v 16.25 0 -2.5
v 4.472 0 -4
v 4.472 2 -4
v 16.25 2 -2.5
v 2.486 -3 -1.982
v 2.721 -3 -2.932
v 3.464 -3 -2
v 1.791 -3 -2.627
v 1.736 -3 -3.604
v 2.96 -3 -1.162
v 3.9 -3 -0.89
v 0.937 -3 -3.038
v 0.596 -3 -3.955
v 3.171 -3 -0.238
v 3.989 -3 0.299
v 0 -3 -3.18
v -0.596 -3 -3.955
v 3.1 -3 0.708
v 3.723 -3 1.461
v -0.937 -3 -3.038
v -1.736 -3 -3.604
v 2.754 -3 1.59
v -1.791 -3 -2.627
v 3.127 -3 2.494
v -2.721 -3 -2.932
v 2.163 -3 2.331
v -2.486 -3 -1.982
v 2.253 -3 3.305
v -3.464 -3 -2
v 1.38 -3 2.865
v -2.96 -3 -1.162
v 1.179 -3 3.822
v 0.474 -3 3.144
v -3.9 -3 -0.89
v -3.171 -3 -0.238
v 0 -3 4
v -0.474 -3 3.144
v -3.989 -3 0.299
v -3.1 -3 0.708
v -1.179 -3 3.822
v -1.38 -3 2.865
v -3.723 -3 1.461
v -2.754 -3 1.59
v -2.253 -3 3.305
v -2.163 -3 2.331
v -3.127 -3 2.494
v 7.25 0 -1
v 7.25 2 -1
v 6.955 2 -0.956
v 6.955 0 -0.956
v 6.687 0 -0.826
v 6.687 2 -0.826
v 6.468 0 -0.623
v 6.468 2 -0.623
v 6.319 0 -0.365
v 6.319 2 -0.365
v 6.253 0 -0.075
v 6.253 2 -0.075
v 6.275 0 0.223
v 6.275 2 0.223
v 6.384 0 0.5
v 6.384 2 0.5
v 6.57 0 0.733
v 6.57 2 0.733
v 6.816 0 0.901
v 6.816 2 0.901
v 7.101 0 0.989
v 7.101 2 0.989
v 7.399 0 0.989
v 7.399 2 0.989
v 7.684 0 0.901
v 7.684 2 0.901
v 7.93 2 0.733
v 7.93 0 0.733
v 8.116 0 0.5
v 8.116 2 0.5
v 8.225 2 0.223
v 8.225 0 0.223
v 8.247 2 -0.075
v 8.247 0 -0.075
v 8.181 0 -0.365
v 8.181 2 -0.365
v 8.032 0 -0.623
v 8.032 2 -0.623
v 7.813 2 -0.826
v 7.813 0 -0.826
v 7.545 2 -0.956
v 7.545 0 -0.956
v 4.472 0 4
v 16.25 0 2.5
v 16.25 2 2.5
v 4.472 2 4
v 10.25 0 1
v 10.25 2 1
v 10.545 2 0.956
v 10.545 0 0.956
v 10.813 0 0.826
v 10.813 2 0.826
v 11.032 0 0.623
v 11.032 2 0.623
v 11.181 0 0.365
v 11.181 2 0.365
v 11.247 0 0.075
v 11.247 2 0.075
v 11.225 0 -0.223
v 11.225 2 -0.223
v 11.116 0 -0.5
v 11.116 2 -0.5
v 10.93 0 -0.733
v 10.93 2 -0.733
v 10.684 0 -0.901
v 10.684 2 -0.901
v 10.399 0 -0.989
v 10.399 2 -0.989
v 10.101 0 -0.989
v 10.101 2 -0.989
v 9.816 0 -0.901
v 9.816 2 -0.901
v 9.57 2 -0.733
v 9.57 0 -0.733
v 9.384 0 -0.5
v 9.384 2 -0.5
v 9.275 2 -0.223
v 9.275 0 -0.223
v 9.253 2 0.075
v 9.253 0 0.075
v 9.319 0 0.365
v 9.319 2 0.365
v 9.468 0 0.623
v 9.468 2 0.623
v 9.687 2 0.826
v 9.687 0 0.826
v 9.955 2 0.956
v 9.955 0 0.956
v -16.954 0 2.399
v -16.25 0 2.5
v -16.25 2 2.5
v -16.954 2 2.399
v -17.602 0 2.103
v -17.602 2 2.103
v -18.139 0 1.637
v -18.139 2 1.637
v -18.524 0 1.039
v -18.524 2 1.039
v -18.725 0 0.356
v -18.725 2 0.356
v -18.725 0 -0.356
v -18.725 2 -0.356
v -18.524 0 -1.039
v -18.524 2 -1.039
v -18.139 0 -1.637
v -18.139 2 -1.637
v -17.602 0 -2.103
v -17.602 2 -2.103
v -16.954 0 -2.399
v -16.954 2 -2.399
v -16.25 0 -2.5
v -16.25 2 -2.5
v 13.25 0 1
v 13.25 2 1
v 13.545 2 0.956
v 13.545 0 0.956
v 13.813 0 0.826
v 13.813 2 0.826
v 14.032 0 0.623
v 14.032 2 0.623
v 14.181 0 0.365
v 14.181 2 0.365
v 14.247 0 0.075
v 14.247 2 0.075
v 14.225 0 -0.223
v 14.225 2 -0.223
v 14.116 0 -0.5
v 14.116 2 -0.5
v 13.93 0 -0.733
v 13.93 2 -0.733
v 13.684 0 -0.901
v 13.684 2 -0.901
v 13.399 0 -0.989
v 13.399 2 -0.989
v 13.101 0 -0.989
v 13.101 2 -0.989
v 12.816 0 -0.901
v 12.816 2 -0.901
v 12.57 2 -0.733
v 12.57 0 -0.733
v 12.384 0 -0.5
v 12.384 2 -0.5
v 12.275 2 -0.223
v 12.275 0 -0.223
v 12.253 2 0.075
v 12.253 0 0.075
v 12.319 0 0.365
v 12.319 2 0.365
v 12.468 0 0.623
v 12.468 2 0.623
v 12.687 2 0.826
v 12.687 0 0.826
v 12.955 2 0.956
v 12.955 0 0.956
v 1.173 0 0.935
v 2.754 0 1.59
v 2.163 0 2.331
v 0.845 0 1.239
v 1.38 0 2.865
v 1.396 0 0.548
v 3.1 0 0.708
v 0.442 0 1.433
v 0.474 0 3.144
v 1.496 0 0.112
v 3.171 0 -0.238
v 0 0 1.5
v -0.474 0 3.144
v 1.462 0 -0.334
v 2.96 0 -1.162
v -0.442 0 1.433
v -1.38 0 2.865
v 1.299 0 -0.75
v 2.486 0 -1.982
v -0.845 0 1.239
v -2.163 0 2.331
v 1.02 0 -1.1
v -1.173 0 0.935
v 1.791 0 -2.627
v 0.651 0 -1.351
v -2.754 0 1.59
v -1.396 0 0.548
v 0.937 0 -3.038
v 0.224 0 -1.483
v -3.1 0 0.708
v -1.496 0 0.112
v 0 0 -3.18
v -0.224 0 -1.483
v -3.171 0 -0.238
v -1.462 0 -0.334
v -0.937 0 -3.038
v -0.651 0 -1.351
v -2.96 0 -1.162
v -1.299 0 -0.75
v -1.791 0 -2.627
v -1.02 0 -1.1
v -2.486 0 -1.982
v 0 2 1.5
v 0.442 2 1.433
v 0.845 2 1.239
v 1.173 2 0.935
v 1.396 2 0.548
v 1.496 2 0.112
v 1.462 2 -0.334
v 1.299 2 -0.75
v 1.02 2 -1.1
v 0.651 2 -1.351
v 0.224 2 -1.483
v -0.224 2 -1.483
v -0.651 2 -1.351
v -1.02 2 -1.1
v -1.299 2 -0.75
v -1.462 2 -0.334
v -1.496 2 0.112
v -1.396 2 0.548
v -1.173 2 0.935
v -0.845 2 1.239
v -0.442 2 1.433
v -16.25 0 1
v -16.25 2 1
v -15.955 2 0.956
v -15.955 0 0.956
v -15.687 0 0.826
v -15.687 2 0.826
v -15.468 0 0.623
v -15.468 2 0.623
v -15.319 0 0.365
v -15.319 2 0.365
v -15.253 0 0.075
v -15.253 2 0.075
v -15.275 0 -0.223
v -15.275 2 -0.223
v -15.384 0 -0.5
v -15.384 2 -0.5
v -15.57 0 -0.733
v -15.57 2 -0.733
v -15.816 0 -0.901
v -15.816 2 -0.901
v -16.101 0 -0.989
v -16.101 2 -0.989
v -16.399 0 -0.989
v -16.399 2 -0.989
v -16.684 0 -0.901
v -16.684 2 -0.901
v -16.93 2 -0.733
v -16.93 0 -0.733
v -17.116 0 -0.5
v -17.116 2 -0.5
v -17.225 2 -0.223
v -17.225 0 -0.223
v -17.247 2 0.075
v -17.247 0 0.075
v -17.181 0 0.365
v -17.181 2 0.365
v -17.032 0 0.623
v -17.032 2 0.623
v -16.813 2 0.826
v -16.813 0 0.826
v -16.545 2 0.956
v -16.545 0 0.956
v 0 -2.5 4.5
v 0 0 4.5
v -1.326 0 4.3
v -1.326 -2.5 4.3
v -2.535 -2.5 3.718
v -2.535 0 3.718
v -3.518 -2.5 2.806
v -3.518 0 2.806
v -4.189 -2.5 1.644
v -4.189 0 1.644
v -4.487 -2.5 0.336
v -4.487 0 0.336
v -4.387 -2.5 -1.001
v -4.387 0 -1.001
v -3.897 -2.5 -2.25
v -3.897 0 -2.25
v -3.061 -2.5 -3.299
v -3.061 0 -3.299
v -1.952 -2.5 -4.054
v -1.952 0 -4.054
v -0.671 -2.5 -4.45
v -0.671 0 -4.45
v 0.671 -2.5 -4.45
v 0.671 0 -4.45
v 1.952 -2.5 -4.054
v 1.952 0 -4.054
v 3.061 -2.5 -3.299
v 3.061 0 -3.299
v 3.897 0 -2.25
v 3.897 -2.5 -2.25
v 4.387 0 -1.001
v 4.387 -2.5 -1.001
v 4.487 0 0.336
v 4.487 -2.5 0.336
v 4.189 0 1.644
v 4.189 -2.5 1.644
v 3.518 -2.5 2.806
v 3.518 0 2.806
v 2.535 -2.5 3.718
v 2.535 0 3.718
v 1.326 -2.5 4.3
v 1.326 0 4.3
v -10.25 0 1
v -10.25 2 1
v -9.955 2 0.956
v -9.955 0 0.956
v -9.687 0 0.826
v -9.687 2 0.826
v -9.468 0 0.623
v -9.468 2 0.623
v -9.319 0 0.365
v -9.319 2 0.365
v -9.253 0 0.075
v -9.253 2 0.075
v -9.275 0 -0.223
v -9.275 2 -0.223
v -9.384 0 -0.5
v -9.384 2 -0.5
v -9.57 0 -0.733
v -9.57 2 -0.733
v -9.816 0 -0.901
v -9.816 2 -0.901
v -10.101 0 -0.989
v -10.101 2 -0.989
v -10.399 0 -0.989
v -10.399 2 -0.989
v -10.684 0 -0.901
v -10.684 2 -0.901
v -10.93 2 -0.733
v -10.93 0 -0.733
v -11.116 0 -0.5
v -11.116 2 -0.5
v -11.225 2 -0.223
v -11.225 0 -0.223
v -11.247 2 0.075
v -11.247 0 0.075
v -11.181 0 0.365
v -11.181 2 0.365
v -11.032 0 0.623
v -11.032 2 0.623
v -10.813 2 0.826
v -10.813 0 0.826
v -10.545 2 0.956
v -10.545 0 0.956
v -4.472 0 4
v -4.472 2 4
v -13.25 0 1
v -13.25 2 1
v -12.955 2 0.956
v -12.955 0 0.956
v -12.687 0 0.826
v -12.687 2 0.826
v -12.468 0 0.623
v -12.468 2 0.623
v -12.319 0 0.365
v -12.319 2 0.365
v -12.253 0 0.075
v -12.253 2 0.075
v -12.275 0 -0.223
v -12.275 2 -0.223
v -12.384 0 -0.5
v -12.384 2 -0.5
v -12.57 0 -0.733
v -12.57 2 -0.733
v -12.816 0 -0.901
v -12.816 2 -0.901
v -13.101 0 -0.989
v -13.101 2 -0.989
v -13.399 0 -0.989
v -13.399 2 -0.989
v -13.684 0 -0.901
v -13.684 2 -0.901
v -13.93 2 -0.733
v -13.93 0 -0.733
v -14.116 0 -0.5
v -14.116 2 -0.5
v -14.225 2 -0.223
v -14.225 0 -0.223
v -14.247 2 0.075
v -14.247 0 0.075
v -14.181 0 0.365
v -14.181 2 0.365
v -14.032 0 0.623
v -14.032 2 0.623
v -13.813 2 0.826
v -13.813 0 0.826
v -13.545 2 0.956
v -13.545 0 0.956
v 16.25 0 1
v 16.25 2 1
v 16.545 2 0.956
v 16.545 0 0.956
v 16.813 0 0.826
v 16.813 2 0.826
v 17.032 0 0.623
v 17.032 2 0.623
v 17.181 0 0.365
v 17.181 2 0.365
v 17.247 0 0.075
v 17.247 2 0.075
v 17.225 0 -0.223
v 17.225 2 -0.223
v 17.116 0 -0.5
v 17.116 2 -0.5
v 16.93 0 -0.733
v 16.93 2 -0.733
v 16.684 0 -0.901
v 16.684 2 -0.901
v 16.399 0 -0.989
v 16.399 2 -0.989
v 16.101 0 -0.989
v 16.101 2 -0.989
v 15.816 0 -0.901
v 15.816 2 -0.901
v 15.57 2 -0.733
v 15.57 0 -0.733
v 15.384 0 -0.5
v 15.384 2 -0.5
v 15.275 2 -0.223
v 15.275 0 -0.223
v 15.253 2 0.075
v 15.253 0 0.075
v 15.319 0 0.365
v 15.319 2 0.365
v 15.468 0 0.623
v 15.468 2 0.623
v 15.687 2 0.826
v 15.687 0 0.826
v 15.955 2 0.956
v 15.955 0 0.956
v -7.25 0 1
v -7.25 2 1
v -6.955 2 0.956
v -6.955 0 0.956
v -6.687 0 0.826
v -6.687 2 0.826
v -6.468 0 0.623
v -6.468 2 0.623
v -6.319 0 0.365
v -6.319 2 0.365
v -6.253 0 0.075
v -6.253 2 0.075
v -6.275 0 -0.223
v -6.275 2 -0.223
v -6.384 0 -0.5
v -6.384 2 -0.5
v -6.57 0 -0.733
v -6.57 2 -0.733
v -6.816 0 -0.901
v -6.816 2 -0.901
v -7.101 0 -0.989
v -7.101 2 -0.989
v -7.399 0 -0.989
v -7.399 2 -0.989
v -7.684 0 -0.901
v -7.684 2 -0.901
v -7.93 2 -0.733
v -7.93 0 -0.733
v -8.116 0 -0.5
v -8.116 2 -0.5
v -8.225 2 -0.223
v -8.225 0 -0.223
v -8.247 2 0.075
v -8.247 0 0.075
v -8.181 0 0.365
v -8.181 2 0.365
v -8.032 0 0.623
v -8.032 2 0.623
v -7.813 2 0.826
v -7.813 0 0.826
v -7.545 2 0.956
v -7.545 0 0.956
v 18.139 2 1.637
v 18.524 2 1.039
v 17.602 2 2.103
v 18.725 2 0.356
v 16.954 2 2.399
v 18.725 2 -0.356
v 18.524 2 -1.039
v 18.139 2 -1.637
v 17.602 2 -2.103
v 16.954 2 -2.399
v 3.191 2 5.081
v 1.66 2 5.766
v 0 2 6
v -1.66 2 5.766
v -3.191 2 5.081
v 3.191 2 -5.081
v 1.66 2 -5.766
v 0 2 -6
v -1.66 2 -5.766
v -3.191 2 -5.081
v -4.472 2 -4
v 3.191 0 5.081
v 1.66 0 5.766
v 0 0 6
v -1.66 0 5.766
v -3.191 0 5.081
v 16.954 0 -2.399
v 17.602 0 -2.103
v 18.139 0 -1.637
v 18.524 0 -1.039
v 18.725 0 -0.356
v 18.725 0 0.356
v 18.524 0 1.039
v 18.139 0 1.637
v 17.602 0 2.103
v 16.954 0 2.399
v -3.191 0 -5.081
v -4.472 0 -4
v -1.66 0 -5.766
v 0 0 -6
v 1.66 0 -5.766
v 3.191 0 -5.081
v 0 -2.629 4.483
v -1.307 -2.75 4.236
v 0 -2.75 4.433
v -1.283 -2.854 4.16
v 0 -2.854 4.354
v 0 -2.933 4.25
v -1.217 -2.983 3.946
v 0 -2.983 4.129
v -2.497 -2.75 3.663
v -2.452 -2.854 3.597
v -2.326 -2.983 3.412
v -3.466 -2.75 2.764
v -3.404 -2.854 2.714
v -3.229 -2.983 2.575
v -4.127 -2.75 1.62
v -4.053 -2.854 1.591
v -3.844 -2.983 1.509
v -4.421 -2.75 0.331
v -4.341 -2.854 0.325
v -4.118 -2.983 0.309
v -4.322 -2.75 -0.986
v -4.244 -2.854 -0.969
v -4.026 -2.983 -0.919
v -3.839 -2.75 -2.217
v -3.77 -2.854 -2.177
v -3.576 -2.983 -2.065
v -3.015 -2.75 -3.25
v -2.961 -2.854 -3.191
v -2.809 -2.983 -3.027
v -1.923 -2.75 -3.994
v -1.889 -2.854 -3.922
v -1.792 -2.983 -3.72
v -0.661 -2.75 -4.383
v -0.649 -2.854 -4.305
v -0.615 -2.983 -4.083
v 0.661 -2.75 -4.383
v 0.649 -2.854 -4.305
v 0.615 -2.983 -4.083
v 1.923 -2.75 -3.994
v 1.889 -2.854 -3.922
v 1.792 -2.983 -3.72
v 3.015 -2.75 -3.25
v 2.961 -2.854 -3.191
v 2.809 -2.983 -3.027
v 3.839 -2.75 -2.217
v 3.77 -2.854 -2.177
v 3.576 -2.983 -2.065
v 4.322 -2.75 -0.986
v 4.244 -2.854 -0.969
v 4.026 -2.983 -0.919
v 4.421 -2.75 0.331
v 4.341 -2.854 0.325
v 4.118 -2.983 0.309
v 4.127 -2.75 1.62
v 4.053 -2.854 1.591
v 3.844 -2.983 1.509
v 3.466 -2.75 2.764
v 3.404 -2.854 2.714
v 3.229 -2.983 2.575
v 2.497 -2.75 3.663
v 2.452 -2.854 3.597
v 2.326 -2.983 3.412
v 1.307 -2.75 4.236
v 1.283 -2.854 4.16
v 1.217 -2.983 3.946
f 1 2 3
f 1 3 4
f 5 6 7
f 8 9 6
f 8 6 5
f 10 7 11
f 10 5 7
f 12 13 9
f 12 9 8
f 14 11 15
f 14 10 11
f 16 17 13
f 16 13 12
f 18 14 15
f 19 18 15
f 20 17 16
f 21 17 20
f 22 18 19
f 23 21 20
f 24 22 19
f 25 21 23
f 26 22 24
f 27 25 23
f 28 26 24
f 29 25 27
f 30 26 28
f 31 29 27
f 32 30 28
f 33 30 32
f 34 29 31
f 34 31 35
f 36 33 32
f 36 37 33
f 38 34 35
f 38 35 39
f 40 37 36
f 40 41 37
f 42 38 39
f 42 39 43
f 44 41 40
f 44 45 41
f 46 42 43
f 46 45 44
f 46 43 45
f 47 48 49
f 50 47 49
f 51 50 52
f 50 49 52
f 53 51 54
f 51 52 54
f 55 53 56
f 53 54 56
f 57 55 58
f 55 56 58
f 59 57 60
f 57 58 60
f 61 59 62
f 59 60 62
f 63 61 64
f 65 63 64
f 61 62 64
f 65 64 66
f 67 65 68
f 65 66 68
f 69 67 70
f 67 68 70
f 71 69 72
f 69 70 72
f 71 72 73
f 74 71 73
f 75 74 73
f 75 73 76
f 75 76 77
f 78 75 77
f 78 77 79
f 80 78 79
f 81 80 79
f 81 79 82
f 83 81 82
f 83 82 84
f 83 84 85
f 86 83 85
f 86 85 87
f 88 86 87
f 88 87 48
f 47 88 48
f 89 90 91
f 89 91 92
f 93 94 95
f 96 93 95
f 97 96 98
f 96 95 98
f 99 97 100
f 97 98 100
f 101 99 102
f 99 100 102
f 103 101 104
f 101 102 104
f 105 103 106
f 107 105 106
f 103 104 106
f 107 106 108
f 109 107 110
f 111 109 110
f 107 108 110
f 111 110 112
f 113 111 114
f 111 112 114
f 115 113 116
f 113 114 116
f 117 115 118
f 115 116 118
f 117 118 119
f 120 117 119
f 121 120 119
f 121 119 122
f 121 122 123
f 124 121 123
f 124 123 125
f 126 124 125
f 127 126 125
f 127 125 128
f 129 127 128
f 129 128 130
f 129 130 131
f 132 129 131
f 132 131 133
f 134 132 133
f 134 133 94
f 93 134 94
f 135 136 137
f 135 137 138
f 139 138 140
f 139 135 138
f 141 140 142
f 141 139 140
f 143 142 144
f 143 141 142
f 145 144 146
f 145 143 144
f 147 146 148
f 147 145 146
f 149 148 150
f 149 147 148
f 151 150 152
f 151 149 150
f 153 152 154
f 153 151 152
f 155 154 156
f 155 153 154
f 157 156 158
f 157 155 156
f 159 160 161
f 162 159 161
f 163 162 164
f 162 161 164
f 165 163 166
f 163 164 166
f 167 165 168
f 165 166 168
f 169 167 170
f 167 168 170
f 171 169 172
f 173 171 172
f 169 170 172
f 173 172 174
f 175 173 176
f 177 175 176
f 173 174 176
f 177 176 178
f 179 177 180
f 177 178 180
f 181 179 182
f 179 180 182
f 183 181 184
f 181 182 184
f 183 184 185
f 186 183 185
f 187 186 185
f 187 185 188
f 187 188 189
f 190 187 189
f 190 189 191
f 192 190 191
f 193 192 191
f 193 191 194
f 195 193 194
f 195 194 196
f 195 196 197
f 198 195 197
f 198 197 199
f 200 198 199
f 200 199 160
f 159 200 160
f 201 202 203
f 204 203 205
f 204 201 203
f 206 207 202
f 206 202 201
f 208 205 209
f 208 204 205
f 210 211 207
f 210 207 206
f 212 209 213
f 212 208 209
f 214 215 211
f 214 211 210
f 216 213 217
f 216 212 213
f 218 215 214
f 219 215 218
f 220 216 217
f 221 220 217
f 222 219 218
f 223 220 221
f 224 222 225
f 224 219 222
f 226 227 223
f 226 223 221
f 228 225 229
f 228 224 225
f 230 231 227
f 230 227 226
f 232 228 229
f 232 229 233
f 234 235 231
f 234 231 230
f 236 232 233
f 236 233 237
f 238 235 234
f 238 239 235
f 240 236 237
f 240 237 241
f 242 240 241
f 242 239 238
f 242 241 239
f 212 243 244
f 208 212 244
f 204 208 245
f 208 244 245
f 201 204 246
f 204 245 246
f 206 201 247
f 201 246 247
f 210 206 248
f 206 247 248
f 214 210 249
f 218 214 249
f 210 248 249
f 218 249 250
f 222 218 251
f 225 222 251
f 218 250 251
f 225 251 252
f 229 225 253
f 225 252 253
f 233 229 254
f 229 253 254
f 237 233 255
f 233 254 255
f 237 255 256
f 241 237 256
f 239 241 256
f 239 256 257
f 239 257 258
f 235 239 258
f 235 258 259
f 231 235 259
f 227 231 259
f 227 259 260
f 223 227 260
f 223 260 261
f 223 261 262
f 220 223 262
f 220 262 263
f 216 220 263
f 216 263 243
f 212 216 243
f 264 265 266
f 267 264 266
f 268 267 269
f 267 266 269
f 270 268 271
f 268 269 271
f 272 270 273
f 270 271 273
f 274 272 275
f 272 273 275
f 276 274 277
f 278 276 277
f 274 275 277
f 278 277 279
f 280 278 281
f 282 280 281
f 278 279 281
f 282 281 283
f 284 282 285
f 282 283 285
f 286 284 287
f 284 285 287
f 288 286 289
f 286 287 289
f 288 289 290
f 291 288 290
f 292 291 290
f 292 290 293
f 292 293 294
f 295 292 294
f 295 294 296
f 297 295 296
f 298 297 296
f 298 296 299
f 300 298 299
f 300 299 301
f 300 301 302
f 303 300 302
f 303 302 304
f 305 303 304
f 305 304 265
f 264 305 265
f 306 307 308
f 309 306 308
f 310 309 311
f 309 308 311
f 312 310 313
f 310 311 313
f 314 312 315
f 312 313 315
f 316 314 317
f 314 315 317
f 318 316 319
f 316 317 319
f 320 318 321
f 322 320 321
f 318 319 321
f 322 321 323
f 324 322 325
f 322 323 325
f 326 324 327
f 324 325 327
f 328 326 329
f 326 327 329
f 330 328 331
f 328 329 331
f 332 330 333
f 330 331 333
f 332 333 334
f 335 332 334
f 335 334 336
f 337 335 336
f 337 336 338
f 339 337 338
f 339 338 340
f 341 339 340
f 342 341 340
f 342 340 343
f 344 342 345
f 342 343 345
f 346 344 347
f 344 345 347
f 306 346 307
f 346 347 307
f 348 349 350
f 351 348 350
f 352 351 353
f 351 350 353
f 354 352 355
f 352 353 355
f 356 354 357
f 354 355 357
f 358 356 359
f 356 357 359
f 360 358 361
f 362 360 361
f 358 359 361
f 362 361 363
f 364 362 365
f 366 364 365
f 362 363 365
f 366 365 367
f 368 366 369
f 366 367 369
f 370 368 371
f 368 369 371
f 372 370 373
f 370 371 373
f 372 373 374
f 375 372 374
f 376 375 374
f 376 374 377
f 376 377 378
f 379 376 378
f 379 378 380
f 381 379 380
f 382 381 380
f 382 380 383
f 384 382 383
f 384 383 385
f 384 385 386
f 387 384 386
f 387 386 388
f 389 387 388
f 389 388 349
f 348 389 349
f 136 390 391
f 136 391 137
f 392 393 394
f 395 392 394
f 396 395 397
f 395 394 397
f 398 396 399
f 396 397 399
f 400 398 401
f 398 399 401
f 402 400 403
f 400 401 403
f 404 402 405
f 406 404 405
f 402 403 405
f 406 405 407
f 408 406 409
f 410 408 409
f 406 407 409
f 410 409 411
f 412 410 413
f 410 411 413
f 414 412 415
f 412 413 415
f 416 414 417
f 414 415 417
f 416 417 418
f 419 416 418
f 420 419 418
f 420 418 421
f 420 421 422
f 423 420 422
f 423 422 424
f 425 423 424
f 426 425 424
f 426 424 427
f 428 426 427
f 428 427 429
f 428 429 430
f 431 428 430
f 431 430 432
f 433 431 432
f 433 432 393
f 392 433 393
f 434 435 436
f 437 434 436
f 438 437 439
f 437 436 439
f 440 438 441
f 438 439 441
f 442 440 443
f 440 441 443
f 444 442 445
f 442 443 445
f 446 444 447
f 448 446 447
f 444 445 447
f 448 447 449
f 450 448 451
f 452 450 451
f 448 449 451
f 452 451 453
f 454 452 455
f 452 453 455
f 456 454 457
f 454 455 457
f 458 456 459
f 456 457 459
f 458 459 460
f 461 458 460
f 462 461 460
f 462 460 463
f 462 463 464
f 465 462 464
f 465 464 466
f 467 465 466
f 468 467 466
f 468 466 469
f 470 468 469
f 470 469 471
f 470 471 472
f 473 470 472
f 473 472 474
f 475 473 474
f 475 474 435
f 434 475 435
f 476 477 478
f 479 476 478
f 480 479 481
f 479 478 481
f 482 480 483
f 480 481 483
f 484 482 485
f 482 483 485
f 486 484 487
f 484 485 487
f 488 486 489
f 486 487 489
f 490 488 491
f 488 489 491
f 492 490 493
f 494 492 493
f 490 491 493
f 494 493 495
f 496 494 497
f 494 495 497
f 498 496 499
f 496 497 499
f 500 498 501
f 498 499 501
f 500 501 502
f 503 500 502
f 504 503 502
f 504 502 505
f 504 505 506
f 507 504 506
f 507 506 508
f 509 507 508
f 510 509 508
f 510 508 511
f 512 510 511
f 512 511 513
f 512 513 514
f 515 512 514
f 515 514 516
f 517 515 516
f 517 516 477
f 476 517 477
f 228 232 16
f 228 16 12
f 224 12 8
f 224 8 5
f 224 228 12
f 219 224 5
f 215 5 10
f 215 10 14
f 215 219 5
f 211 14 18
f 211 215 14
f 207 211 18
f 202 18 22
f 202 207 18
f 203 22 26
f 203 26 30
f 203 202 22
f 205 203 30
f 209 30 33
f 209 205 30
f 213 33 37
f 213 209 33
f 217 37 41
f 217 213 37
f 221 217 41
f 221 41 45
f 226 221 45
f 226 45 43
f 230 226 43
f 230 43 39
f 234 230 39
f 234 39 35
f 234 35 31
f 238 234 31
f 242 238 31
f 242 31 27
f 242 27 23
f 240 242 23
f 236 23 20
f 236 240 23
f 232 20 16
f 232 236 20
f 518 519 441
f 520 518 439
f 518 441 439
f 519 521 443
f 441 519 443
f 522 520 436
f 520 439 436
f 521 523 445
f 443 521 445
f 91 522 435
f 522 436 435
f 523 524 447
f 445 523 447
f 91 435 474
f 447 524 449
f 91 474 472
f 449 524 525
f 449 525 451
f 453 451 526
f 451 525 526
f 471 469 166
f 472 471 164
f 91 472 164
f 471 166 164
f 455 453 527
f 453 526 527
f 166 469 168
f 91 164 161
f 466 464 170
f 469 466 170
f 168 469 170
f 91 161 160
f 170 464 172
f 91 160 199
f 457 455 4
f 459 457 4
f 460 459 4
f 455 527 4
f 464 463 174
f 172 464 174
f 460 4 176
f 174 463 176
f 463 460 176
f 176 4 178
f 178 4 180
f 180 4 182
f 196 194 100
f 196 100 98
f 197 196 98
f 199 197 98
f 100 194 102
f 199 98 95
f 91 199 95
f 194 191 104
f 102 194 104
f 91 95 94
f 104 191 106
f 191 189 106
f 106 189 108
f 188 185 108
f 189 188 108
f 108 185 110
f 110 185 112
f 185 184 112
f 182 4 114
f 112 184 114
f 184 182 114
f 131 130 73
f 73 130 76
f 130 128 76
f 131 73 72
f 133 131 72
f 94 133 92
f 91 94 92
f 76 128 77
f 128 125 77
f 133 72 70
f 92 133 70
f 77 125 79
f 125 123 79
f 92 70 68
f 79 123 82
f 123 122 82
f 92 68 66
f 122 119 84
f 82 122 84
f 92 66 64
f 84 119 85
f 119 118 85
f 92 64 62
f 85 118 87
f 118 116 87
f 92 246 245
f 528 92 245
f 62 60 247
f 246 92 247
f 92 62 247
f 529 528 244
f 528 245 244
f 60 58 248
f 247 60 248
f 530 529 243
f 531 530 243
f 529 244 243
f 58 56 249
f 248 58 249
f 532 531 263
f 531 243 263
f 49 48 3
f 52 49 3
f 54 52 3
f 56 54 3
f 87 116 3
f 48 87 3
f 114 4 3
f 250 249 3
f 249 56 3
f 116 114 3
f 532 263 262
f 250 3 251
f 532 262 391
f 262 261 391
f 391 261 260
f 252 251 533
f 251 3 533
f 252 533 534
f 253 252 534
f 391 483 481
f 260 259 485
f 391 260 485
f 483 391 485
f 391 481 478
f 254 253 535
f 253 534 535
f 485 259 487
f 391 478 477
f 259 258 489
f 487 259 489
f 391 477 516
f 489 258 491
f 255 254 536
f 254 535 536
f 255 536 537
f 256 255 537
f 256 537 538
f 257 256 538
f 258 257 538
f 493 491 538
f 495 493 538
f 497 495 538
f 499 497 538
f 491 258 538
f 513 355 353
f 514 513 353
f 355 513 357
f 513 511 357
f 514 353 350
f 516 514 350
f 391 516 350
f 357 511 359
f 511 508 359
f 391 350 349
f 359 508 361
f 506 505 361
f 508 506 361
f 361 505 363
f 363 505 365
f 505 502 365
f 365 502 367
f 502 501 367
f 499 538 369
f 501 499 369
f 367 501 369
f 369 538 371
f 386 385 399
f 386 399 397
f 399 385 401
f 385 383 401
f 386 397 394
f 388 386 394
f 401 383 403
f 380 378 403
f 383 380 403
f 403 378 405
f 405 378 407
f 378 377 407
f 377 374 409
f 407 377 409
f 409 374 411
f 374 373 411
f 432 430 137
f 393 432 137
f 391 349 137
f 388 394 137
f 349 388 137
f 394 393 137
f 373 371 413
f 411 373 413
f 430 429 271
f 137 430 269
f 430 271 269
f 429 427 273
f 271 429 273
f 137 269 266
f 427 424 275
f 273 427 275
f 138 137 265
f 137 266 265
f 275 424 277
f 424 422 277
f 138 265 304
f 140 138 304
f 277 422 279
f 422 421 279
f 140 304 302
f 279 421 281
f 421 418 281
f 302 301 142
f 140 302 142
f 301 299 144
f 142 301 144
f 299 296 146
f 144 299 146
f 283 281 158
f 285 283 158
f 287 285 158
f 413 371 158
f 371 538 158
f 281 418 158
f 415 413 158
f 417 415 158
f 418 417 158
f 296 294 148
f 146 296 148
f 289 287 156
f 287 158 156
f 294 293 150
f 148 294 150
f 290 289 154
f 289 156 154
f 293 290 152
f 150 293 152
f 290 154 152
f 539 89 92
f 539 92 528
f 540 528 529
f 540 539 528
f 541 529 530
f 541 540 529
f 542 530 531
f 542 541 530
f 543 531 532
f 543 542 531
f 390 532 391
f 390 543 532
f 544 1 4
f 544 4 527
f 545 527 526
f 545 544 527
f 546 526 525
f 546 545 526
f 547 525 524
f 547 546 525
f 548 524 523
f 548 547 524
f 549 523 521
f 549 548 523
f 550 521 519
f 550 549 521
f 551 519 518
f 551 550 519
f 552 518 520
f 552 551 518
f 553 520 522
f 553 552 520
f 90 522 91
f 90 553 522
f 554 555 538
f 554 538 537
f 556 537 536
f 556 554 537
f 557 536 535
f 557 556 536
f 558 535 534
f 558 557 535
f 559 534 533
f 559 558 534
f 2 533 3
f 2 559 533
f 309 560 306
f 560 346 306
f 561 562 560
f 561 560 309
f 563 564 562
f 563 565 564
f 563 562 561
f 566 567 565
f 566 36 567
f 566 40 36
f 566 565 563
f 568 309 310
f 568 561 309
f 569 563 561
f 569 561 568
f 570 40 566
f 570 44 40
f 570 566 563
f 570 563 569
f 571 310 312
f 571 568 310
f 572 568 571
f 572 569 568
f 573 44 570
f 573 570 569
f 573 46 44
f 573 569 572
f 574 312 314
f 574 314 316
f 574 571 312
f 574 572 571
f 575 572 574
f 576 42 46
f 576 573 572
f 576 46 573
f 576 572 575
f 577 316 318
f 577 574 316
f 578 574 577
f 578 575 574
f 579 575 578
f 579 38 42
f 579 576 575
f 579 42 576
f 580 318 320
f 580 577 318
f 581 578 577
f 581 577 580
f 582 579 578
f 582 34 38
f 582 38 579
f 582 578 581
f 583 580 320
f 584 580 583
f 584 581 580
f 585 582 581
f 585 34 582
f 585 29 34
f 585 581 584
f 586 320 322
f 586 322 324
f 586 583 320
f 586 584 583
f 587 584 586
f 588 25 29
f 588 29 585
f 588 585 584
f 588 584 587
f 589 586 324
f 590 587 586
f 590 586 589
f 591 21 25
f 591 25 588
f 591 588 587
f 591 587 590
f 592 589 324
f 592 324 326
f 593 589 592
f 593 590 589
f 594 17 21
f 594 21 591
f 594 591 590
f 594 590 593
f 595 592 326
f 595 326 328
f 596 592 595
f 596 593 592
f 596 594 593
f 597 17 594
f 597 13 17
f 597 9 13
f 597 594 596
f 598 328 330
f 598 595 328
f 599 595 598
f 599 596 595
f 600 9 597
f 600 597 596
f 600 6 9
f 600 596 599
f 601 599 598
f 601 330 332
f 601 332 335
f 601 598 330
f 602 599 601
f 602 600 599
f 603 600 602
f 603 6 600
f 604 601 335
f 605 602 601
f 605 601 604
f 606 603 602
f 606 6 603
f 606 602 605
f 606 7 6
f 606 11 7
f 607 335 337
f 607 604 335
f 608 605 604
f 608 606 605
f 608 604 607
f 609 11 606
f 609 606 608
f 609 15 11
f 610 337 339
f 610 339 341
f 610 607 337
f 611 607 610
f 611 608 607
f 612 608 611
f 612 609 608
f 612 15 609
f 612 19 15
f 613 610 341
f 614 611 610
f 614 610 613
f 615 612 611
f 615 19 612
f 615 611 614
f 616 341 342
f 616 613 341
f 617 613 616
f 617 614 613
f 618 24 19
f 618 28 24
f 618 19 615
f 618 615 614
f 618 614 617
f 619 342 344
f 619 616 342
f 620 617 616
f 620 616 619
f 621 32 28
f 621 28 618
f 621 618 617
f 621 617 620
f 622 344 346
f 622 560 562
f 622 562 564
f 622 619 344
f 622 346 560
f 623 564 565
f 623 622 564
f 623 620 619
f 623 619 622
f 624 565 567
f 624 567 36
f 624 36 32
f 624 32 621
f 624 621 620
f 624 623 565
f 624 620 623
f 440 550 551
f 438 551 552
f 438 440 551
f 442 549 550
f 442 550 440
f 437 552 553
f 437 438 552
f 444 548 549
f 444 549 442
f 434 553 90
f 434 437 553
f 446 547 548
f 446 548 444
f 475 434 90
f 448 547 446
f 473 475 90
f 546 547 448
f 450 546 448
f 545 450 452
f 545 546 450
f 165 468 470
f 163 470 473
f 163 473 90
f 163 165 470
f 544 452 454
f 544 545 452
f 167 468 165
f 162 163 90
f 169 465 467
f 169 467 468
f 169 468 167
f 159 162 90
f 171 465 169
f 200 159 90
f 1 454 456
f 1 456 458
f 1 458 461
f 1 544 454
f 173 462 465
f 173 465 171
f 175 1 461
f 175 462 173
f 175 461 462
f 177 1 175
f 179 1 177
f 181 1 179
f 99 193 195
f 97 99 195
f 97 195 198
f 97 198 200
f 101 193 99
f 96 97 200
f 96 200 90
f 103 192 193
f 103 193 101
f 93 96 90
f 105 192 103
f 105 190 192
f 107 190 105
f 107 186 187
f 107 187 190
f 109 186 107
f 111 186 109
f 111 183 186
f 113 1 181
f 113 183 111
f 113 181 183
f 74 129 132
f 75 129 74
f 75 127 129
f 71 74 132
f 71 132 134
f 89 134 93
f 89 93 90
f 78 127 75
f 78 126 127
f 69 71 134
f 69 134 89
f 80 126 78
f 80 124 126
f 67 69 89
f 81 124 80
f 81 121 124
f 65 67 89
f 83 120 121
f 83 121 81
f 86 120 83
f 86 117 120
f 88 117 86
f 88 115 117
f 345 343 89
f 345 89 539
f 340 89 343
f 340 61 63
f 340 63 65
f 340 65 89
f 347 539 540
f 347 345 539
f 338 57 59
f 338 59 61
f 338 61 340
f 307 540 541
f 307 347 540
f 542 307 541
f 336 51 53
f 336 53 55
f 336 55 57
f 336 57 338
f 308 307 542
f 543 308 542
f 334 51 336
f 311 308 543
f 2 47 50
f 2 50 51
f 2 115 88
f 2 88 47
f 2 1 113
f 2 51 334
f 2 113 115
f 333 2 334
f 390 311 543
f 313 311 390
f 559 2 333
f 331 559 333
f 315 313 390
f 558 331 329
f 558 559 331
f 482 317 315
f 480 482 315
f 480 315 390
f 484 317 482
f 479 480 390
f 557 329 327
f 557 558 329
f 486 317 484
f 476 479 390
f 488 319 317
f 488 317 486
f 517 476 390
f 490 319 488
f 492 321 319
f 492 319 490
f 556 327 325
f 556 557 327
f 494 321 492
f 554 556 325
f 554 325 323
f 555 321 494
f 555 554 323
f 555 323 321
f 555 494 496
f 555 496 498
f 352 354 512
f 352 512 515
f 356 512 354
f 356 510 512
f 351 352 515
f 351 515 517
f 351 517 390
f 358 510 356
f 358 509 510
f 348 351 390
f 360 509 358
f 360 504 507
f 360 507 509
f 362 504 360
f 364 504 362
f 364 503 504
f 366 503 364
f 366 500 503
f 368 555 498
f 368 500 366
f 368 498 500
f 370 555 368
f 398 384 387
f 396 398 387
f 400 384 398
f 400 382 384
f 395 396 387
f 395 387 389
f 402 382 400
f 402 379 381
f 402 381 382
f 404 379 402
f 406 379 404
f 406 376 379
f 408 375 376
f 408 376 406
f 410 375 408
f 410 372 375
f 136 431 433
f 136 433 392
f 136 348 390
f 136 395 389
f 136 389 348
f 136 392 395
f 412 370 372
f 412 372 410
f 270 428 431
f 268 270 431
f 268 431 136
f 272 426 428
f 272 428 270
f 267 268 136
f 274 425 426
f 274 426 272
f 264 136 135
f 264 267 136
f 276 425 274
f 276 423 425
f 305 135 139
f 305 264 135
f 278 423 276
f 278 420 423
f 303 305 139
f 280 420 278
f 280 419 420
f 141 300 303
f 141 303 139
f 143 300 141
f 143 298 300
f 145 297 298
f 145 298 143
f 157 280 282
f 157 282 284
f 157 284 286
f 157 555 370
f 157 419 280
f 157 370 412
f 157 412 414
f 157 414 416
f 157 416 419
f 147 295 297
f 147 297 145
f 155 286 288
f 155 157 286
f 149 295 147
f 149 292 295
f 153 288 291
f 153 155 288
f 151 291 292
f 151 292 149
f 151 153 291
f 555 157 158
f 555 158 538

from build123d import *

# Parameters (mm, degrees)
BOSS_EXTRUDE1_DEPTH = 2
SKETCH3_R           = 1
SKETCH3_R_2         = 1.5
CUT_EXTRUDE1_DEPTH  = 20.787938245
SKETCH4_R           = 4.5
SKETCH4_R_2         = 3.179560916
BOSS_EXTRUDE2_DEPTH = 3
FILLET1_R           = 0.5


with BuildPart() as part:
    # Sketch1 → Boss-Extrude1 (new body)
    with BuildSketch(Plane(origin=(0, 0, 0), x_dir=(1, 0, 0), z_dir=(0, 1, 0))):
        with BuildLine():
            Line((4.472135955, 4), (16.25, 2.5))
            ThreePointArc((16.25, 2.5), (18.75, 0), (16.25, -2.5))
            Line((16.25, -2.5), (4.472135955, -4))
            ThreePointArc((4.472135955, -4), (0, -6), (-4.472135955, -4))
            Line((-4.472135955, -4), (-16.25, -2.5))
            ThreePointArc((-16.25, -2.5), (-18.75, 0), (-16.25, 2.5))
            Line((-16.25, 2.5), (-4.472135955, 4))
            ThreePointArc((-4.472135955, 4), (0, 6), (4.472135955, 4))
        make_face()
    extrude(amount=BOSS_EXTRUDE1_DEPTH)

    # Sketch3 → Cut-Extrude1 (cut, through all)
    with BuildSketch(Plane(origin=(0, 2, 0), x_dir=(1, 0, 0), z_dir=(0, 1, 0))):
        with Locations(Location((-10.25, 0, 0), (0, 0, 270))):
            Circle(SKETCH3_R)
        with Locations(Location((-7.25, 0, 0), (0, 0, 270))):
            Circle(SKETCH3_R)
        with Locations(Location((0, 0, 0), (0, 0, 270))):
            Circle(SKETCH3_R_2)
        with Locations(Location((13.25, 0, 0), (0, 0, 270))):
            Circle(SKETCH3_R)
        with Locations(Location((16.25, 0, 0), (0, 0, 270))):
            Circle(SKETCH3_R)
        with Locations(Location((10.25, 0, 0), (0, 0, 270))):
            Circle(SKETCH3_R)
        with Locations(Location((-16.25, 0, 0), (0, 0, 270))):
            Circle(SKETCH3_R)
        with Locations(Location((-13.25, 0, 0), (0, 0, 270))):
            Circle(SKETCH3_R)
        with Locations(Location((7.25, 0, 0), (0, 0, 90))):
            Circle(SKETCH3_R)
    extrude(amount=-CUT_EXTRUDE1_DEPTH, mode=Mode.SUBTRACT)

    # Sketch4 → Boss-Extrude2 (add)
    with BuildSketch(Plane.XZ):
        with Locations(Location((0, 0, 0), (0, 0, 90))):
            Circle(SKETCH4_R)
        with Locations(Location((0, 0, 0), (0, 0, 270))):
            Circle(SKETCH4_R_2, mode=Mode.SUBTRACT)
    extrude(amount=BOSS_EXTRUDE2_DEPTH)

    # Fillet1
    fillet1_edges = [part.edges().sort_by_distance(p)[0] for p in [
        (0, -3, -4.5),
    ]]
    fillet(fillet1_edges, radius=FILLET1_R)


solid = part.part
